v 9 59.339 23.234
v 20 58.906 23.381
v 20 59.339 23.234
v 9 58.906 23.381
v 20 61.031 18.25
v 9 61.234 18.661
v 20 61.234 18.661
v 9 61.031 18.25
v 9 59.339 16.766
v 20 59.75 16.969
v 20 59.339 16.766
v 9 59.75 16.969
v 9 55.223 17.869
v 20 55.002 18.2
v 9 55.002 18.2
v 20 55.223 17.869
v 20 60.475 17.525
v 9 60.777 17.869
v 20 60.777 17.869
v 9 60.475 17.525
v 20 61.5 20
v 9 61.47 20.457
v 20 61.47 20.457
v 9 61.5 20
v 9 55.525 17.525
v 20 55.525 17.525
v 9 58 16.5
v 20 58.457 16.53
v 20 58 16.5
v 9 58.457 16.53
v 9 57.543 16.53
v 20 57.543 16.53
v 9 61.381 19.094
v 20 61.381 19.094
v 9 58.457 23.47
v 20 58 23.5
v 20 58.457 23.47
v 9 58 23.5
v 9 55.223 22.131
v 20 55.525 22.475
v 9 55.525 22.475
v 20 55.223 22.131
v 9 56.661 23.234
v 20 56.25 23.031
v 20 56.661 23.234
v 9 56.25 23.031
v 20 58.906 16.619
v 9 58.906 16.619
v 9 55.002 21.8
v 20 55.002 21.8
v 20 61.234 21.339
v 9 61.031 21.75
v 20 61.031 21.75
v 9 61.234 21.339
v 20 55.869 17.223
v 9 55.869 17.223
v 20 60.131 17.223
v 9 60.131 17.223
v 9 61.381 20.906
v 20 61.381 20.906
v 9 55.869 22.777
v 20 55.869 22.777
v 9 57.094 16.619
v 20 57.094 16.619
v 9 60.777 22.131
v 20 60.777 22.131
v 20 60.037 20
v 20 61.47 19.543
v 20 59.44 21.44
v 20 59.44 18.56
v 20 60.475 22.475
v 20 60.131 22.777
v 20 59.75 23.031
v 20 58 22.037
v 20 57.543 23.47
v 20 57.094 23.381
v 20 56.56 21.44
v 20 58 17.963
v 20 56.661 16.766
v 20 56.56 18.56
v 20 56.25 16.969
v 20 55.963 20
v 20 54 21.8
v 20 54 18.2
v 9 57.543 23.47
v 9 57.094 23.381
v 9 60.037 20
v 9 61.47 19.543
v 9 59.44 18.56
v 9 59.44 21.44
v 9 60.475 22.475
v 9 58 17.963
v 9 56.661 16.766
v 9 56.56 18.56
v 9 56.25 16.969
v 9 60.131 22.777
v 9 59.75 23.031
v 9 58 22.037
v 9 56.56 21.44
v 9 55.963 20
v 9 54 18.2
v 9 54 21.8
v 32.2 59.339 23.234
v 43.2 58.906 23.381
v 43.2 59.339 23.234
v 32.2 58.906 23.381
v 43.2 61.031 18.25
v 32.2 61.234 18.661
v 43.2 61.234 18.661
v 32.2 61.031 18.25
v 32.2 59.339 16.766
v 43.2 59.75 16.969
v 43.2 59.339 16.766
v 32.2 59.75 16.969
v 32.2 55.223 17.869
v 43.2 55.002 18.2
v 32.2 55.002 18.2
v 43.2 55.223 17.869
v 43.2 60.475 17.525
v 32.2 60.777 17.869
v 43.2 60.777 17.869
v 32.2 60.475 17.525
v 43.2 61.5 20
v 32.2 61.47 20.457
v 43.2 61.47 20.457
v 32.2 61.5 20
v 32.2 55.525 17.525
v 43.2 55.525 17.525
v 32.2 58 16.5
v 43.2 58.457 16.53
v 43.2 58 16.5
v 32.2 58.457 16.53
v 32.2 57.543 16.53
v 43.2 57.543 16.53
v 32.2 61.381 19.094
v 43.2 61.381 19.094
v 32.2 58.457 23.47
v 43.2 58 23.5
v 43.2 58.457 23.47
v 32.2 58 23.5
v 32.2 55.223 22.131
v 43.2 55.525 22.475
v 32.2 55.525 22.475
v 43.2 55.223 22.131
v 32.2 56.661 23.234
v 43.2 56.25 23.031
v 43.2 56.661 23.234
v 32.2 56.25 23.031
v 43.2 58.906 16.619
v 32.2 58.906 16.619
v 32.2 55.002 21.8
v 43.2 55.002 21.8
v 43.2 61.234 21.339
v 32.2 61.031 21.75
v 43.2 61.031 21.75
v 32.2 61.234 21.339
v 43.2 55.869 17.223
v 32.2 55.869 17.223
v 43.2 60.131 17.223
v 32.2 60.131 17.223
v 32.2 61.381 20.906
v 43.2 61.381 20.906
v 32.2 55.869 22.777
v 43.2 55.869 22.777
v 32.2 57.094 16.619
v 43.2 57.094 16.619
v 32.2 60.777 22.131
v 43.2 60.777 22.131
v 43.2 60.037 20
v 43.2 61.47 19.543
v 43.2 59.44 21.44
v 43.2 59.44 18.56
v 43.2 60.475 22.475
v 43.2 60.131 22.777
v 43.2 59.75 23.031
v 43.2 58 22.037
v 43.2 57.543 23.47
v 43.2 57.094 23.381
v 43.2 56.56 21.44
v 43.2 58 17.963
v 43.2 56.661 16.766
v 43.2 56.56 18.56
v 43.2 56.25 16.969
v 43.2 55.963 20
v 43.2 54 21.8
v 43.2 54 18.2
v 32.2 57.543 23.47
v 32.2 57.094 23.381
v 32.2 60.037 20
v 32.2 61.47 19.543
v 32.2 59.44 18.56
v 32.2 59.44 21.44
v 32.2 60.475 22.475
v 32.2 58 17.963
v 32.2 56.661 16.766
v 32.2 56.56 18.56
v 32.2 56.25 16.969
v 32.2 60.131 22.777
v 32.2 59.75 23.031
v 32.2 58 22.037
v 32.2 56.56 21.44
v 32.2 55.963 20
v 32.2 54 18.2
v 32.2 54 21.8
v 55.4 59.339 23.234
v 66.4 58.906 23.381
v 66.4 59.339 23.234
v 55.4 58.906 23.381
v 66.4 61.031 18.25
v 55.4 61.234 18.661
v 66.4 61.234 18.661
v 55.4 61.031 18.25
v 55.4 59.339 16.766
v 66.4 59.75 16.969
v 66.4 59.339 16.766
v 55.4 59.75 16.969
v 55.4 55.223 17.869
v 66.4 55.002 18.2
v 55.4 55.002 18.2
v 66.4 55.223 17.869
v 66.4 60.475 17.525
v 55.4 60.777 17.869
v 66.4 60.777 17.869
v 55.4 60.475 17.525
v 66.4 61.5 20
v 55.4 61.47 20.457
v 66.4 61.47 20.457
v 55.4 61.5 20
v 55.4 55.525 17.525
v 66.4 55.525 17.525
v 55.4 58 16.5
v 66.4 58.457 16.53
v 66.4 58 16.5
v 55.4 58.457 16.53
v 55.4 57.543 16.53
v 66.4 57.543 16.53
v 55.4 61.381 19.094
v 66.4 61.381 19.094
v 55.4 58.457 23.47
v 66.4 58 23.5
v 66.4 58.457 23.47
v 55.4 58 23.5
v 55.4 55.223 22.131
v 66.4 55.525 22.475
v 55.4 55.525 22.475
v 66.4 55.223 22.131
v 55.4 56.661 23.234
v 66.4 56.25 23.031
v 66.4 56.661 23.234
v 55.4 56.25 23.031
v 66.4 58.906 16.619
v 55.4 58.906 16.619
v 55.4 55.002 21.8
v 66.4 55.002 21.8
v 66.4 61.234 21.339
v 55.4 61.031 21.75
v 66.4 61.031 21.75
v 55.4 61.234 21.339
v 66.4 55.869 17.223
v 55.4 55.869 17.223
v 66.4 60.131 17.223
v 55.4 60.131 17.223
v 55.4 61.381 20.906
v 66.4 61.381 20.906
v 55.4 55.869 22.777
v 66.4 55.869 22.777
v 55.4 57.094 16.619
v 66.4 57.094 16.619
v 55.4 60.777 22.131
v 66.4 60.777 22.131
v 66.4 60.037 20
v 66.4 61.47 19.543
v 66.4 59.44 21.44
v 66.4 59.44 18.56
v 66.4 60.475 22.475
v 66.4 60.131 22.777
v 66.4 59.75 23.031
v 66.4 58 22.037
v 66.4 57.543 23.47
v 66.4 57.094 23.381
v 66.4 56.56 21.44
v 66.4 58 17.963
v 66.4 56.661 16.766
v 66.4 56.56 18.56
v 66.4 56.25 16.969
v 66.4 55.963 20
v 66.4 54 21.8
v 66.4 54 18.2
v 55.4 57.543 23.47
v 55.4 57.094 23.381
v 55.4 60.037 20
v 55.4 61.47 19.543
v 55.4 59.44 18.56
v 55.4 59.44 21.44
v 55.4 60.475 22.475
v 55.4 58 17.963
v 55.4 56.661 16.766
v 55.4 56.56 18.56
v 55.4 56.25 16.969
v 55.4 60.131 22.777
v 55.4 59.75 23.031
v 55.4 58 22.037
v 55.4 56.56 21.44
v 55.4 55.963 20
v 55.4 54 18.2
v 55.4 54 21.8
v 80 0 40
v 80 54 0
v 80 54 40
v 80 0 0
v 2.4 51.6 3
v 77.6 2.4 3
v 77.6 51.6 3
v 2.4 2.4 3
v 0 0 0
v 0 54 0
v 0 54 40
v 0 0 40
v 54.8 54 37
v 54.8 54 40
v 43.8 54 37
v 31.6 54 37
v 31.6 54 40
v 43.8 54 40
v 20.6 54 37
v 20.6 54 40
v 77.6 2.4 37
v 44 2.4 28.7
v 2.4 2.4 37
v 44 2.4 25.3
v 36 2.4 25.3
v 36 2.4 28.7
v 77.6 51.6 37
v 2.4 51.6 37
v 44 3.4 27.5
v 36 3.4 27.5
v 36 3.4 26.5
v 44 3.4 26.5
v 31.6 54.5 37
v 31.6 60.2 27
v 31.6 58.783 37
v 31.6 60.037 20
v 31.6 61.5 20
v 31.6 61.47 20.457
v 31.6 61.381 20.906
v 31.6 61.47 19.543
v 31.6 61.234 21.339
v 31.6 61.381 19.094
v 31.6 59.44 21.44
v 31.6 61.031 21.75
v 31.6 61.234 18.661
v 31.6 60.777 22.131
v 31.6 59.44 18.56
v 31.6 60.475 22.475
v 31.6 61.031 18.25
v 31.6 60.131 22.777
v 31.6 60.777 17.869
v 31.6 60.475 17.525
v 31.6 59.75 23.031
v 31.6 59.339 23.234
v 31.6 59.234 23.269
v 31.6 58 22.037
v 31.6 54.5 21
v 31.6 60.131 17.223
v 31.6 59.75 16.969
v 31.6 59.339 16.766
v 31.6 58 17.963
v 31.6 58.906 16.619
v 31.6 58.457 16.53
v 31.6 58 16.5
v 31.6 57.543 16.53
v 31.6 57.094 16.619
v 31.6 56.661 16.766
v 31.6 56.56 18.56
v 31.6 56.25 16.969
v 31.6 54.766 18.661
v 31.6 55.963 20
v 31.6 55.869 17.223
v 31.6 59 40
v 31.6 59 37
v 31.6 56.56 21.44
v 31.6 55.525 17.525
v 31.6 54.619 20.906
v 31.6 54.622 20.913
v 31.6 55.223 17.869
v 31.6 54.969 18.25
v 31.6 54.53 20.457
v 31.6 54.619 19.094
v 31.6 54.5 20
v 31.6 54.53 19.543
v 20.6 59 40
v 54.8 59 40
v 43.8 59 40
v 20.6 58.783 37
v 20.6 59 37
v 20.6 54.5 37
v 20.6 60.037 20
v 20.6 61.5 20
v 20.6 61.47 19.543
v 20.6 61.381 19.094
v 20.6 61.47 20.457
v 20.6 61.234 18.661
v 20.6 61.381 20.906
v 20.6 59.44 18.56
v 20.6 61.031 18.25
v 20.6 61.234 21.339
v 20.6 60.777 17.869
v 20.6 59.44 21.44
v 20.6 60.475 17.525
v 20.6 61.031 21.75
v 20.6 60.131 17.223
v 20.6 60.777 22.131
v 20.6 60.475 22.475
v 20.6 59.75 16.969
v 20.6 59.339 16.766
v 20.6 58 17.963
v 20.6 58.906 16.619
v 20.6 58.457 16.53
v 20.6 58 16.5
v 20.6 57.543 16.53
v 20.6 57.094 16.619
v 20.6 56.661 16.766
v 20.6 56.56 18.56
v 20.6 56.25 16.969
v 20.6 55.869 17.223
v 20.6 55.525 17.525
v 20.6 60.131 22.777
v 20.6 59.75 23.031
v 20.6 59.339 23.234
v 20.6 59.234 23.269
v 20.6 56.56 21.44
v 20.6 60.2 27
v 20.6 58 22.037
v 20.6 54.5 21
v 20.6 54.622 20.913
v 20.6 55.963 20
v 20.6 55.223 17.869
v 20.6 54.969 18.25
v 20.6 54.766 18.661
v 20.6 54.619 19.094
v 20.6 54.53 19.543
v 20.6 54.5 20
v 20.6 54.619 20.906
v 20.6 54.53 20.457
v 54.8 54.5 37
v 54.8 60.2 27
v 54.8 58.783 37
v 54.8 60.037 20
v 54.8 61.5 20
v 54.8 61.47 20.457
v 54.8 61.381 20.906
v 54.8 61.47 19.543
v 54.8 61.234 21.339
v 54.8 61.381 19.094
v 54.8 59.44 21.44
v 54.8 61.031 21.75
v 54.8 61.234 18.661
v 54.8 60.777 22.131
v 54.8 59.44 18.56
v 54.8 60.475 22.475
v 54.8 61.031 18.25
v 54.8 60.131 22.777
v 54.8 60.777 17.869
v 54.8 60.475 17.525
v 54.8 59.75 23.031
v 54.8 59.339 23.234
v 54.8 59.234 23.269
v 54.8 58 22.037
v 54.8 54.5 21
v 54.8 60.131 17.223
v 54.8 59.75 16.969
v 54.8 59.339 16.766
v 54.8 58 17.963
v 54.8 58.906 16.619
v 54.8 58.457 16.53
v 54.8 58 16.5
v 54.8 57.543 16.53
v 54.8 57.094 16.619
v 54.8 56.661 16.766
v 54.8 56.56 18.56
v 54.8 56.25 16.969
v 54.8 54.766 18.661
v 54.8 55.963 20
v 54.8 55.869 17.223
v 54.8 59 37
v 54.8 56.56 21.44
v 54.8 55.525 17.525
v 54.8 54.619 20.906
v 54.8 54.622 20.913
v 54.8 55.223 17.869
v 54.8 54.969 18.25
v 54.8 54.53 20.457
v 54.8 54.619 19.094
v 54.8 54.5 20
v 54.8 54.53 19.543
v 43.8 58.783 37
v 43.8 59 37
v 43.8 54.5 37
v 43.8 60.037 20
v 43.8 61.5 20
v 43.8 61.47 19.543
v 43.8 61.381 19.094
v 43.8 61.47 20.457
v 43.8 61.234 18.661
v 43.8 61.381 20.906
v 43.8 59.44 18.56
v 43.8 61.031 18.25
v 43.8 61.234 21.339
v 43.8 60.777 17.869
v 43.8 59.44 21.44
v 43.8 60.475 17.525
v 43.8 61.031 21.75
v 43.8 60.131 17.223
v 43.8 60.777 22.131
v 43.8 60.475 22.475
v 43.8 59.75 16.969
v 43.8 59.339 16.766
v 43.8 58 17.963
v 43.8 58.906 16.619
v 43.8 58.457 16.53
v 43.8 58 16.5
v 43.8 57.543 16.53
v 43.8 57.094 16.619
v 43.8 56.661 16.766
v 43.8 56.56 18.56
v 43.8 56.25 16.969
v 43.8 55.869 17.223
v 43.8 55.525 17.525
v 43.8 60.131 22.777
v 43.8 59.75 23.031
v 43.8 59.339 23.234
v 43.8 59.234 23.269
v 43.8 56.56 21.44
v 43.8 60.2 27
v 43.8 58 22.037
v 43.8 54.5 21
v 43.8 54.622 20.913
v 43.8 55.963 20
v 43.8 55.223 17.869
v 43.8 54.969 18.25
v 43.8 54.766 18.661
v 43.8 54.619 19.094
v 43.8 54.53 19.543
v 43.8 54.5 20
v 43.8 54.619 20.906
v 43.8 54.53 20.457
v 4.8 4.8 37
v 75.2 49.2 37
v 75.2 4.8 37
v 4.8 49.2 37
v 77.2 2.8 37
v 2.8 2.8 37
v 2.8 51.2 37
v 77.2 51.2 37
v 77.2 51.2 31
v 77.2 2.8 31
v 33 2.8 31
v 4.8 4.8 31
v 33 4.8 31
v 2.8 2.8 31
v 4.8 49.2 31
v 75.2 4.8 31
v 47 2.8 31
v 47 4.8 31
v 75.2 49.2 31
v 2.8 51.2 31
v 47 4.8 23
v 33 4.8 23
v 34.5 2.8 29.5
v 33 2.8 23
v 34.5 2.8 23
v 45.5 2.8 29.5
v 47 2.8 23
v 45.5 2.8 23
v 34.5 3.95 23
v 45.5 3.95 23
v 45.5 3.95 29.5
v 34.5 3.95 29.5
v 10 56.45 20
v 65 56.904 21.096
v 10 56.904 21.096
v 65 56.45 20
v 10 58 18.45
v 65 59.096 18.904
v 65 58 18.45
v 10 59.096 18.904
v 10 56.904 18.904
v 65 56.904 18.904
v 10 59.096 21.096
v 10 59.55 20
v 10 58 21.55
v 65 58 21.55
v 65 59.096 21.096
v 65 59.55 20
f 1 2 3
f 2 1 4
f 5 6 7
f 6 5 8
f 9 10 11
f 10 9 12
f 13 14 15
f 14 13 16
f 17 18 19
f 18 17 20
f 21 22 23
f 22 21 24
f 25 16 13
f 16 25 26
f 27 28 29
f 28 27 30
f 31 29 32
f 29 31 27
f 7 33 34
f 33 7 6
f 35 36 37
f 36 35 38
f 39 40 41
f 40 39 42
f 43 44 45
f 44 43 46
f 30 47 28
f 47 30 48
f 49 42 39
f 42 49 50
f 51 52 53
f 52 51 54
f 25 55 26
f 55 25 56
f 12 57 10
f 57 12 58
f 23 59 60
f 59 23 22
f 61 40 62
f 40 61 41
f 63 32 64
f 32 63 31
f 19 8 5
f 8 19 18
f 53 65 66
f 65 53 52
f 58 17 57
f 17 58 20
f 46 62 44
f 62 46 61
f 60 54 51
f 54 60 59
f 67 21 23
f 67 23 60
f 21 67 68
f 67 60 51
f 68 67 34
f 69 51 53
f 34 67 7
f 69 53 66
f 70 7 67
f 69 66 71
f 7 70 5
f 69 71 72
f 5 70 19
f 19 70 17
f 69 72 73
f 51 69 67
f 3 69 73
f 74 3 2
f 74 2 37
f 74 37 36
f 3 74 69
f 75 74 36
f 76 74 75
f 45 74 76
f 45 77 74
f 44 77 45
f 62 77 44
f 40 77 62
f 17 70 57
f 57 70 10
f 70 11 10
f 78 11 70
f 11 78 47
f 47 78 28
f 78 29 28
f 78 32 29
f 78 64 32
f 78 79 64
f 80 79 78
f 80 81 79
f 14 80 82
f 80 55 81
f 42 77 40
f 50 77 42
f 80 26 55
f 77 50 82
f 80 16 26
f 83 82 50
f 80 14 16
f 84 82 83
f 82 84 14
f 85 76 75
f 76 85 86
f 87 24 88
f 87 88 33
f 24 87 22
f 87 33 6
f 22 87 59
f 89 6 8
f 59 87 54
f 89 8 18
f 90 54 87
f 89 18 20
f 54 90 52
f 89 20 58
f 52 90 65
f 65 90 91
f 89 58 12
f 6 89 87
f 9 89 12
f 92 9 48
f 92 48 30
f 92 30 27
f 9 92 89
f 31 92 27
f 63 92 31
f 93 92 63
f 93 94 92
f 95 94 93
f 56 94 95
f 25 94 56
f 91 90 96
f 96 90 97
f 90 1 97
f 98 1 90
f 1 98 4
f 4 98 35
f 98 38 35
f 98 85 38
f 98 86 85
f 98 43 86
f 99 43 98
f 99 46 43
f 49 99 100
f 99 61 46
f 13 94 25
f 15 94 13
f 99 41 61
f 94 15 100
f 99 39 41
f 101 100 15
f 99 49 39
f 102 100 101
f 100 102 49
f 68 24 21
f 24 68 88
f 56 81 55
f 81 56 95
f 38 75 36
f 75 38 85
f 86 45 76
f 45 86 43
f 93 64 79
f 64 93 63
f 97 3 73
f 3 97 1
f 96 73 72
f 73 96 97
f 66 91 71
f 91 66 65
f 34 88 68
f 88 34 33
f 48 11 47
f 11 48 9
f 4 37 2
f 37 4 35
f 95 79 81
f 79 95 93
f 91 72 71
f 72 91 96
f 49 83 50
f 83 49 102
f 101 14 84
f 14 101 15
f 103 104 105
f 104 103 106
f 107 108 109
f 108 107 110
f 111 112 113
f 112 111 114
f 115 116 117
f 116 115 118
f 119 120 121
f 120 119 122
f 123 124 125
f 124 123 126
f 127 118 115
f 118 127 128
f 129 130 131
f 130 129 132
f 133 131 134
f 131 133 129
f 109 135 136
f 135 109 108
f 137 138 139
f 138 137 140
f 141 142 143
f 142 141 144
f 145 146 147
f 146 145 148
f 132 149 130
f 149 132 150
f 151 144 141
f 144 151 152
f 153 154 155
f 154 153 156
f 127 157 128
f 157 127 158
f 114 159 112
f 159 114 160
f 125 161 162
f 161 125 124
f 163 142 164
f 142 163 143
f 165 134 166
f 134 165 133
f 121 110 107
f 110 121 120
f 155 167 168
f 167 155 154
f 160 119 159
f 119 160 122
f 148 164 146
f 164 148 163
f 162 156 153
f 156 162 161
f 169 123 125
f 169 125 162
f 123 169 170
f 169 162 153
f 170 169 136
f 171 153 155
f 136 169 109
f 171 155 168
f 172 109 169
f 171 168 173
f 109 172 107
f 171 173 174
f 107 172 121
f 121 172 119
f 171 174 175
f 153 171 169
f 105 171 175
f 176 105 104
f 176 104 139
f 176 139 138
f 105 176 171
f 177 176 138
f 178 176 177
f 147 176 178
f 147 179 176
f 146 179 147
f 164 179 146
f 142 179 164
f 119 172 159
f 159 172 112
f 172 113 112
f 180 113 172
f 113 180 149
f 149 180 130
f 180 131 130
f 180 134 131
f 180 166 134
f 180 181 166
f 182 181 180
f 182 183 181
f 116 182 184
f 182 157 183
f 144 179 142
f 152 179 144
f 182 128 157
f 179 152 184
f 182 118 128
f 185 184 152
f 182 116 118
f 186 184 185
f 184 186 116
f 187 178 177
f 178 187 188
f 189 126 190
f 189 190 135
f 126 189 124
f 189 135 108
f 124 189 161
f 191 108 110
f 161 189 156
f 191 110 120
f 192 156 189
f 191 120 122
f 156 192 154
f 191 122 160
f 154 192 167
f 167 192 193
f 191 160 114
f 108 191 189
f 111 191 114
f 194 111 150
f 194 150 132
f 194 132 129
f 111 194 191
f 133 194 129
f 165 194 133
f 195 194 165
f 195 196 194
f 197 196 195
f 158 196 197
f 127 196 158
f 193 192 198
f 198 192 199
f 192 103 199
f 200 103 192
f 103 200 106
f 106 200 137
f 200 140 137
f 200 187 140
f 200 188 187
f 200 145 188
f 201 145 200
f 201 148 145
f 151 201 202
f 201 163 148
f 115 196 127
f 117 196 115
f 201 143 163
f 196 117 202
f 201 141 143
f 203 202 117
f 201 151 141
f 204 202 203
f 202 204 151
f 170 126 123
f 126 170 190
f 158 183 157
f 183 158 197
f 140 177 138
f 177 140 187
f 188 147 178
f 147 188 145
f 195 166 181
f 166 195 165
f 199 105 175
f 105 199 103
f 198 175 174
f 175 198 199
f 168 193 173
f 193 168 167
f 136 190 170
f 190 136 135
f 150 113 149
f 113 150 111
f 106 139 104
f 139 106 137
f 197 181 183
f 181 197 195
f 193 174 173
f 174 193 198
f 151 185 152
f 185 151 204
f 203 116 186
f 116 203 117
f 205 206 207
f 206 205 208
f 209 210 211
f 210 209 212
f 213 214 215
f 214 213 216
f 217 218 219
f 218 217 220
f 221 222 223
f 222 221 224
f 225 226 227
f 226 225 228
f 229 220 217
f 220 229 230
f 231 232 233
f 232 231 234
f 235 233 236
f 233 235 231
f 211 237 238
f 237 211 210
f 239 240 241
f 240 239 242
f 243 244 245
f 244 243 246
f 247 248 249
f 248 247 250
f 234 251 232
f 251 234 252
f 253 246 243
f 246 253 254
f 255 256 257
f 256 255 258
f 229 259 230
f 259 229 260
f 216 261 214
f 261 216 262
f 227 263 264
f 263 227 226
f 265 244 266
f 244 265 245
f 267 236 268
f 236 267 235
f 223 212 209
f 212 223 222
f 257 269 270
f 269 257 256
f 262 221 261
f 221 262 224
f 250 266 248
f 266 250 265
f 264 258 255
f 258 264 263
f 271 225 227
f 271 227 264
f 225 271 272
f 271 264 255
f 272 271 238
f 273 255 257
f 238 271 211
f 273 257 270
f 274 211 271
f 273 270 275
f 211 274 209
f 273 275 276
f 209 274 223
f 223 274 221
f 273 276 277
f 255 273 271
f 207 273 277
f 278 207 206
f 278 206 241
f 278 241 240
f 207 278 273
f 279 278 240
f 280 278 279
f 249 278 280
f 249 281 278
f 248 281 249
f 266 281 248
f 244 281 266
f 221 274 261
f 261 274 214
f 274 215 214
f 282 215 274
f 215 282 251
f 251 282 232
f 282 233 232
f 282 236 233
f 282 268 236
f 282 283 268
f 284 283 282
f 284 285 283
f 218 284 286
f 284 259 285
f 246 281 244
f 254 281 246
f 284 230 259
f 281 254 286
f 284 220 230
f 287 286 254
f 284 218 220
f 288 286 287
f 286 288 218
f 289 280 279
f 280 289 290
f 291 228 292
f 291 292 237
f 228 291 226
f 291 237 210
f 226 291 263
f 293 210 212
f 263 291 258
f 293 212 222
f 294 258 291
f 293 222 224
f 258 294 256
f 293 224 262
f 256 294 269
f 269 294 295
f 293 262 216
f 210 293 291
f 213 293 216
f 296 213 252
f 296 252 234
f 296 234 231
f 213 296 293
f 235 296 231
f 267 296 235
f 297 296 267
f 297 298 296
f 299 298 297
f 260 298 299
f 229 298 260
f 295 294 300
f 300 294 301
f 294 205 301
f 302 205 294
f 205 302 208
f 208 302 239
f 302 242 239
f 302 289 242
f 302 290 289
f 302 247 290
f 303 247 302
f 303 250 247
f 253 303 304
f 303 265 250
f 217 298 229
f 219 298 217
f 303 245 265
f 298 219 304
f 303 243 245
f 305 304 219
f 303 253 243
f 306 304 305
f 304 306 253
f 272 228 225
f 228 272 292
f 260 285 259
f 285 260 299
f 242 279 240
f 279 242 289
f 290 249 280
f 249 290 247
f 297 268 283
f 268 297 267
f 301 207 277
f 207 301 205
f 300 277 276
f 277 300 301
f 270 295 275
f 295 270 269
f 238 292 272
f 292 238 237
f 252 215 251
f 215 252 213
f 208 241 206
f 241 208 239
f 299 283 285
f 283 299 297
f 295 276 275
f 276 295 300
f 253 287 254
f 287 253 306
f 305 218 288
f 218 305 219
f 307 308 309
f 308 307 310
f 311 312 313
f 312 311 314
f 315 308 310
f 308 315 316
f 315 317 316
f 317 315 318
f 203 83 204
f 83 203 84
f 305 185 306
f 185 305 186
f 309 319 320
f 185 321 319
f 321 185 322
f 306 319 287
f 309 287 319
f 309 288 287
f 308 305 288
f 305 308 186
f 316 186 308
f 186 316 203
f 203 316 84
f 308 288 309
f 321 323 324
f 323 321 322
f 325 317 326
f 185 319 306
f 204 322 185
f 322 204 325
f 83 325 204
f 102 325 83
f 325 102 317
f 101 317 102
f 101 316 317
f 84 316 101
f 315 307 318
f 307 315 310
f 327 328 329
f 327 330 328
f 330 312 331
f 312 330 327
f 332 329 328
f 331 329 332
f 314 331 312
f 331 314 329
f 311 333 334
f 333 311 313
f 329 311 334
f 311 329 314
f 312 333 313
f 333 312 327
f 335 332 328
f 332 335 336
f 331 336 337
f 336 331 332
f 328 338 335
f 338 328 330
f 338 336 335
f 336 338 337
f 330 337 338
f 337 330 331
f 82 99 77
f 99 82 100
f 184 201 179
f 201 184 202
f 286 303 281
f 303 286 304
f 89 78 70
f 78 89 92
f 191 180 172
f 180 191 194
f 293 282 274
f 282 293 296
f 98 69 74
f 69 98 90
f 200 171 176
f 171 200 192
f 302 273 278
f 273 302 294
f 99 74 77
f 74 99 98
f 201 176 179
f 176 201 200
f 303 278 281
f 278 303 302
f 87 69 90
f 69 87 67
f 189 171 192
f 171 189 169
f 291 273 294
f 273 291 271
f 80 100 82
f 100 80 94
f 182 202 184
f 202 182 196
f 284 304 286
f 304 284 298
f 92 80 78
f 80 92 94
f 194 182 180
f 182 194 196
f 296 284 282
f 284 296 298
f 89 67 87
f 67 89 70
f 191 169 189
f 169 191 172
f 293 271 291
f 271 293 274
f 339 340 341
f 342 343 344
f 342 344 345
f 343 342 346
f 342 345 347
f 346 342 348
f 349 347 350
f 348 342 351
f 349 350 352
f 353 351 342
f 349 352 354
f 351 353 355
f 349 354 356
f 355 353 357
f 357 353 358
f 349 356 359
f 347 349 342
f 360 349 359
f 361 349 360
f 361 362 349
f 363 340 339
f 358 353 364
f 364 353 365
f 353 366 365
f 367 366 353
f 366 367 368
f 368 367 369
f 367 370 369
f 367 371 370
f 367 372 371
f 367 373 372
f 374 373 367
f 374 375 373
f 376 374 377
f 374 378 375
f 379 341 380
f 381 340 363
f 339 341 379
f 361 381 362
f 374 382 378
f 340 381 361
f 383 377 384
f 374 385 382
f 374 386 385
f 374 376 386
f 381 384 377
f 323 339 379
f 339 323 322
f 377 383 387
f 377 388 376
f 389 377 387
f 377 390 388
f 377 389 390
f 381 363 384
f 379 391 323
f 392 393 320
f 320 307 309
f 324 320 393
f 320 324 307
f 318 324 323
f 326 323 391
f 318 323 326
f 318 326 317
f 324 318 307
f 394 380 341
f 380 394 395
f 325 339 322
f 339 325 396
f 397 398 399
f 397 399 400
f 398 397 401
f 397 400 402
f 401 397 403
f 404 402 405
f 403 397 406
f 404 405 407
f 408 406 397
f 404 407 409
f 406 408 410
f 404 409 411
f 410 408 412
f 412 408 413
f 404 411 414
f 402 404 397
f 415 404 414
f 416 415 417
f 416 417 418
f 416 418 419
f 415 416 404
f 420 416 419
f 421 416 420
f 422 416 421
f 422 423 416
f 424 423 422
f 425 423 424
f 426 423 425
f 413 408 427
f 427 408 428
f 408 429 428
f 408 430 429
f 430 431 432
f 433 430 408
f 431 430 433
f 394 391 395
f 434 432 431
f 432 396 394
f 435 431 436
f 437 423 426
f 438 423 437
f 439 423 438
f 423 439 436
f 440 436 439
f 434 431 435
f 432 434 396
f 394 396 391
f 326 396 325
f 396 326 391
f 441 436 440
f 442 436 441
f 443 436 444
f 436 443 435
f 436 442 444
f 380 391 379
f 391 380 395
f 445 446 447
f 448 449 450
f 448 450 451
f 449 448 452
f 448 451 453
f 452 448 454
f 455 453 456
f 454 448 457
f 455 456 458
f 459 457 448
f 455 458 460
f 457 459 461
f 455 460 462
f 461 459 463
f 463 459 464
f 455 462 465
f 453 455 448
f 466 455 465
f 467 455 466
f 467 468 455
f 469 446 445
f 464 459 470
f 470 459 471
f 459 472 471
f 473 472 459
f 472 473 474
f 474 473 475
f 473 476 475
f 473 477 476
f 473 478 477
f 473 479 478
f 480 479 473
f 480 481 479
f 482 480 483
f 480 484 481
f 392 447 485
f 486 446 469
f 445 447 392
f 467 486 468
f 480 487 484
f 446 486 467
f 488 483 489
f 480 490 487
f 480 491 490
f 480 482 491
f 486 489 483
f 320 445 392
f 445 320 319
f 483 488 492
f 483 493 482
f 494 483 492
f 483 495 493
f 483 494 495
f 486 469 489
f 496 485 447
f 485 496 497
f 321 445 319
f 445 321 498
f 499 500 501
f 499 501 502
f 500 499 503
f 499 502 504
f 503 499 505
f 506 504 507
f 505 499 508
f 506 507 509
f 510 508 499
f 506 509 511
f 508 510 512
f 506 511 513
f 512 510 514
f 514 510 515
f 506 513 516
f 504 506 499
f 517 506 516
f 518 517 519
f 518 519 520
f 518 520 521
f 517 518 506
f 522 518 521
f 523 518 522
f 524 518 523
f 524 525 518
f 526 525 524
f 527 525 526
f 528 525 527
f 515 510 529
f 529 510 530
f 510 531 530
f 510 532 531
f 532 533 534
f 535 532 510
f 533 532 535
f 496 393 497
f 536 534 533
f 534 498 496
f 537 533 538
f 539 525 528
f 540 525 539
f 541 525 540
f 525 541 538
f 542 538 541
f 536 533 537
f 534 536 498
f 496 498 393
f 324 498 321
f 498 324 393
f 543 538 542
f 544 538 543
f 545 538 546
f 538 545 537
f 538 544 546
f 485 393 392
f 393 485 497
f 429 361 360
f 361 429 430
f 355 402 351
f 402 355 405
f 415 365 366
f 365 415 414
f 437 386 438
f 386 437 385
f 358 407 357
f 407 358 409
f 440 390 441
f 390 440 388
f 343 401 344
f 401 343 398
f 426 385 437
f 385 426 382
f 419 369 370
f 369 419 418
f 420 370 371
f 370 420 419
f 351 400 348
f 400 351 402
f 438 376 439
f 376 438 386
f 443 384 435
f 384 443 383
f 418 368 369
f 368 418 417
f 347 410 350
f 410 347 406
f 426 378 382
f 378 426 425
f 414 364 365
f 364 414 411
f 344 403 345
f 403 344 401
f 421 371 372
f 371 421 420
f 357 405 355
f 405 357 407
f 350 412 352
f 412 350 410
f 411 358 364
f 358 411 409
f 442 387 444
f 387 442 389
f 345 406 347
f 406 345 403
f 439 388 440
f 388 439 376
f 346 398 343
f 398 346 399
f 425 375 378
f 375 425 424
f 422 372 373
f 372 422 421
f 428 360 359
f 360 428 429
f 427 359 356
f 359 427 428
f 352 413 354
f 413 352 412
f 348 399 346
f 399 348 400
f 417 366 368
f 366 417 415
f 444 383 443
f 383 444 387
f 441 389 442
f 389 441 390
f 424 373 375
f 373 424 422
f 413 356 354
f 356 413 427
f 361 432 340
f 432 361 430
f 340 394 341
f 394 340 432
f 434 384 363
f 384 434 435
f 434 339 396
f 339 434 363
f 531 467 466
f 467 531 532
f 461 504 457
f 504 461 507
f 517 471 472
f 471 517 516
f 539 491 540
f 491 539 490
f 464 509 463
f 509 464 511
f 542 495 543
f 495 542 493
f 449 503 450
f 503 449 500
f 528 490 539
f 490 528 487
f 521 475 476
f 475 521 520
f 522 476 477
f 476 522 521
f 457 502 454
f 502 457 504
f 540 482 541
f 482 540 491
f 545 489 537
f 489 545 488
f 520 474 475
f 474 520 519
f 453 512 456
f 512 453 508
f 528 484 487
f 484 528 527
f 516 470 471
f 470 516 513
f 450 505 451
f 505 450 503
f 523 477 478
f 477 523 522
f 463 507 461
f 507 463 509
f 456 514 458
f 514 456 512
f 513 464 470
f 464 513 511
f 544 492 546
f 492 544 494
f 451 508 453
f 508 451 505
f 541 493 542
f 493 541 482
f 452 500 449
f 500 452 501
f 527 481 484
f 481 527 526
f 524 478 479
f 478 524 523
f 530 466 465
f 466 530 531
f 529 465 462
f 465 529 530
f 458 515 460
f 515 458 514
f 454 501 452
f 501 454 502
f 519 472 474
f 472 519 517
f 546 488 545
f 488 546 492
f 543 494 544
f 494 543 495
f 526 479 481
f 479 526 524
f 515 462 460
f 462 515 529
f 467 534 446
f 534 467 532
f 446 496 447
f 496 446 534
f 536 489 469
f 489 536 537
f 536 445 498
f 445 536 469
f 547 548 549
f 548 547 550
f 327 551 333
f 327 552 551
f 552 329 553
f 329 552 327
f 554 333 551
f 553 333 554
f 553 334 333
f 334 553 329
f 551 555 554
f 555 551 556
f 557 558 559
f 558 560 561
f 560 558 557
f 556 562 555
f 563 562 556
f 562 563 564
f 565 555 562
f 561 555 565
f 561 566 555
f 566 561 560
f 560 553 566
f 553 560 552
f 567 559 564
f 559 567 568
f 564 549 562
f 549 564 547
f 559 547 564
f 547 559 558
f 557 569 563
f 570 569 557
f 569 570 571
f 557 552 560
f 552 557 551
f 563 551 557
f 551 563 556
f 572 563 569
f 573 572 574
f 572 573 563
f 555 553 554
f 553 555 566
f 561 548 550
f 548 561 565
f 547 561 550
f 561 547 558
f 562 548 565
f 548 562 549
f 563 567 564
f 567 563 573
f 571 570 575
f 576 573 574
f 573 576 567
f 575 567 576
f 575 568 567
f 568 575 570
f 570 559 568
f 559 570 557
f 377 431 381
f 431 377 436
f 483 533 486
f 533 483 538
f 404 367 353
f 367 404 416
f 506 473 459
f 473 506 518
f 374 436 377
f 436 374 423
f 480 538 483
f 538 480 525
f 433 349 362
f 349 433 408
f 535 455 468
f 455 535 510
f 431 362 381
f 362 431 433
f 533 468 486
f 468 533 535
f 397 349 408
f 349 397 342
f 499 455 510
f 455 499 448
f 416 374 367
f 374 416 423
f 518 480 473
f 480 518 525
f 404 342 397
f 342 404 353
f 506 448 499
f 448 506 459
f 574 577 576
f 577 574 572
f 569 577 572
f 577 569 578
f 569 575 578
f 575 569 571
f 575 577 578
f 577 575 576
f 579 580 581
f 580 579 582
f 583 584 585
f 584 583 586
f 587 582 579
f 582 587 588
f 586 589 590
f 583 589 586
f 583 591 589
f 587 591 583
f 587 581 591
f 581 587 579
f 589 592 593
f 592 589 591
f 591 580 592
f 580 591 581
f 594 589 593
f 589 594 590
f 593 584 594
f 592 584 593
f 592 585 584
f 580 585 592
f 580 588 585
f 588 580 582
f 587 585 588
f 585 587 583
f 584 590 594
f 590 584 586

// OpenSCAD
// Box with print-in-place hinge
// Closed body 80 (x) x 54 (y body, 61.5 incl. hinge) x 40 (z) mm.
// Lid occupies the top 10 mm. Hinge pin axis: y=58, z=20 (mid-height at the
// back), so swinging the lid -180 deg about that axis lays the lid flat on
// the bed behind the box: that is the print-in-place pose.
// Clearances (PLA, 0.4 nozzle): pin/bore 0.40 radial, knuckle axial gaps
// 0.6, lid lip to box walls 0.4, lid barrels to box back wall 0.5.

part = "assembly"; // [assembly, box, lid, pin]
cadverify_only = "";

W = 80; D = 54; H = 40; box_h = 30;
wall = 2.4; floor_t = 3; plate_t = 3;
hinge_y = 58; hinge_z = 20;
barrel_r = 3.5; bore_r = 2.0; pin_r = 1.55; cap_r = 2.9;
hinge_ymax = hinge_y + barrel_r;          // 61.5
box_segs  = [[9, 11], [32.2, 11], [55.4, 11]];   // [x0, len]
lid_segs  = [[20.6, 11], [43.8, 11]];
pin_x0 = 10; pin_len = 55;

module instance(name, partname, unit = 1) {
    echo(cadverify_instance = [name, partname, unit]);
    if (cadverify_only == "" || cadverify_only == name) children();
}

// Extrude a (y,z) profile along +x starting at x0, offset by (oy,oz).
module extrude_yz(profile, x0, len, oy = 0, oz = 0) {
    multmatrix([[0,0,1,x0],[1,0,0,oy],[0,1,0,oz],[0,0,0,1]])
        linear_extrude(height = len) polygon(points = profile);
}

module barrel(x0, len) {
    translate([x0, hinge_y, hinge_z]) rotate([0, 90, 0])
        cylinder(h = len, r = barrel_r, $fn = 48);
}

bore_fr = pin_r * cos(22.5) + 0.45;   // bore facet distance: uniform 0.45 gap around the pin
bore_oct_r = bore_fr / cos(22.5);
module bore_cut() {
    // octagonal bore, same diamond orientation as the pin: facet gap 0.45 everywhere
    extrude_yz(oct_pts(bore_oct_r, 0), 4, 72, hinge_y, hinge_z);
}

module box_closed() {
    difference() {
        union() {
            // floor and walls up to z=30
            translate([0, 0, 0]) cube([W, D, floor_t]);
            translate([0, 0, floor_t]) cube([W, wall, box_h - floor_t]);              // front
            translate([0, D - wall, floor_t]) cube([W, wall, box_h - floor_t]);       // back
            translate([0, wall, floor_t]) cube([wall, D - 2*wall, box_h - floor_t]);  // left
            translate([W - wall, wall, floor_t]) cube([wall, D - 2*wall, box_h - floor_t]); // right
            // front catch detent bump on the inner front wall (wedged ridge)
            extrude_yz([[2.4,25.3],[3.4,26.5],[3.4,27.5],[2.4,28.7]], 36, 8);
            // hinge knuckles + arms to the back wall
            for (s = box_segs) {
                barrel(s[0], s[1]);
                translate([s[0], 53.5, hinge_z - 1.8]) cube([s[1], 5, 3.6]);
            }
        }
        bore_cut();
    }
}

module lid_closed() {
    difference() {
        union() {
            // top plate + back hinge tabs
            translate([0, 0, H - plate_t]) cube([W, D, plate_t]);
            for (s = lid_segs) translate([s[0], 53, H - plate_t]) cube([s[1], 6, plate_t]);
            // external skirt (down to z=30, flush with box walls outside)
            translate([0, 0, box_h]) cube([W, wall, H - plate_t - box_h]);                  // front
            translate([0, D - wall, box_h]) cube([W, wall, H - plate_t - box_h]);           // back
            translate([0, wall, box_h]) cube([wall, D - 2*wall, H - plate_t - box_h]);      // left
            translate([W - wall, wall, box_h]) cube([wall, D - 2*wall, H - plate_t - box_h]); // right
            // inner sealing lip (0.4 clear of box inner walls)
            translate([2.8, 2.8, 31]) cube([74.4, 2, 6]);        // front lip
            translate([2.8, 49.2, 31]) cube([74.4, 2, 6]);       // back lip
            translate([2.8, 4.8, 31]) cube([2, 44.4, 6]);        // left lip
            translate([75.2, 4.8, 31]) cube([2, 44.4, 6]);       // right lip
            // central catch tongue on the front lip, reaching down to z=23
            translate([33, 2.8, 23]) cube([14, 2, 8]);
            // hinge knuckles + diagonal straps up to the plate tabs
            for (s = lid_segs) {
                barrel(s[0], s[1]);
                extrude_yz([[54.5,39],[58.5,39],[60.2,27],[58,18.5],[54.5,21]], s[0], s[1]);
            }
        }
        bore_cut();
        // catch notch in the tongue: open at the bottom, receives the box detent bump when shut
        translate([34.5, 2.7, 22.5]) cube([11, 1.25, 7]);
        // fingernail scoop in the front skirt bottom edge
        translate([40, -1, box_h]) rotate([90, 0, 0]) cylinder(h = 4, r = 4.5, $fn = 32);
    }
}

function oct_pts(r, off = 22.5) = [for (i = [0:7]) let (a = off + 45*i) [r*cos(a), r*sin(a)]];

module pin_closed() {
    // octagonal axle with a vertex up/down (45 deg facets, no flat ceiling),
    // ends protrude past the outer knuckles
    extrude_yz(oct_pts(pin_r, 0), pin_x0, pin_len, hinge_y, hinge_z);
}

// --- printed (as-exported) orientations ---
module lid_printed() {
    // closed lid rotated 180 deg about the hinge axis, then dropped to y=0
    translate([0, hinge_ymax, H]) rotate([180, 0, 0]) lid_closed();
}
pin_off = pin_r; // 1.55 half-height of the diamond-oriented shaft
module pin_printed() {
    translate([-pin_x0, -(hinge_y - pin_off), -(hinge_z - pin_off)]) pin_closed();
}

box_spec = [
    ["bounds", [[0, 0, 0], [W, hinge_ymax, box_h]]],
    ["bodies", 1],
    ["support_faces", [["bed", "-z", 4000]]],
    ["overhangs_allowed", [
        ["hinge barrels and arms: horizontal print-in-place axle housings, bore is self-supported inside the tube", [[8, 53, 16], [67.5, 62, 24]]]
    ]],
    ["copies", 1],
    ["details", [
        ["floor", "material", [[10, 10, 0.5], [70, 44, 2.5]], 0.98],
        ["interior", "void", [[6, 6, 8], [74, 48, 24]], 0.98],
        ["front_wall", "thickness", [40, -1, 15], [0, 1, 0], 2.4],
        ["knuckle_arm", "material", [[10, 53.8, 18.8], [19, 55.8, 21.2]], 0.9],
        ["hinge_bore", "void", [[10, 57.1, 19.1], [19, 58.9, 20.9]], 1.0],
        ["catch_bump", "material", [[37, 2.6, 26.6], [43, 3.3, 27.4]], 0.85],
        ["catch_bump_view", "view", [[35, 2, 24], [45, 4.5, 29.5]]],
        ["hinge_view", "view", [[8, 53, 15], [67, 62, 25]]]
    ]]
];

lid_spec = [
    ["bounds", [[0, 0, 0], [W, hinge_ymax, 23.5]]],
    ["bodies", 1],
    ["support_faces", [["bed", "-z", 4000]]],
    ["overhangs_allowed", [
        ["hinge barrels and straps: horizontal print-in-place axle housings", [[20, 0, 0], [55.5, 8, 24]]],
        ["catch groove underside in print pose", [[34, 56, 11], [46, 59, 15]]]
    ]],
    ["copies", 1],
    ["details", [
        ["top_plate", "material", [[10, 17.5, 0.5], [70, 51.5, 2.5]], 0.98],
        ["front_skirt", "material", [[10, 59.3, 4.5], [70, 61.3, 7.5]], 0.9],
        ["plate_thickness", "thickness", [40, 30, -1], [0, 0, 1], 3],
        ["tongue", "material", [[38, 57, 9.2], [42, 58.5, 10.3]], 0.85],
        ["catch_groove", "void", [[37, 57.7, 12], [43, 58.5, 14]], 1.0],
        ["hinge_bore", "void", [[23, 2.6, 19.1], [29, 4.4, 20.9]], 1.0],
        ["strap", "material", [[23, 3.5, 8], [29, 6.5, 12]], 0.8],
        ["catch_groove_view", "view", [[33, 56.5, 9], [47, 59, 17]]],
        ["lid_knuckle_view", "view", [[20, 0, 16], [32, 8, 24]]]
    ]]
];

pin_spec = [
    ["bounds", [[0, 0, 0], [pin_len, 2*pin_off, 2*pin_off]]],
    ["bodies", 1],
    ["overhangs_allowed", [
        ["the two bottom facets of the diamond print-in-place axle, 0.45 above the bore", [[-0.1, 0.35, -0.1], [55.1, 2.75, 0.55]]]
    ]],
    ["copies", 1],
    ["details", [
        ["shaft", "material", [[10, 0.9, 0.9], [50, 2.2, 2.2]], 0.9],
        ["shaft_thickness", "thickness", [30, pin_off, -1], [0, 0, 1], 3.1],
        ["pin_end_view", "view", [[0, 0, 0], [3, 3.1, 3.1]]]
    ]]
];

assembly_spec = [
    ["bounds", [[0, 0, 0], [W, hinge_ymax, H]]],
    ["support_faces", [["table", "-z", 4000]]],
    ["motions", [
        ["lid_swing", ["lid"], "rotate", [0, hinge_y, hinge_z], [1, 0, 0], [-180, 0],
            ["flex", [["lid", "box", 1.0, "front catch tongue snaps 0.6 mm over the detent bump while closing"]]]]
    ]],
    ["assembly_order", [
        [["box"], [0, 0, 0]],
        [["lid"], [0, 0, -1], ["rotate", [0, hinge_y, hinge_z], [1, 0, 0], 180]],
        [["pin"], [1, 0, 0]]
    ]],
    ["print_in_place", 0.4],
    ["print_pose", [["lid_swing", -180]]],
    ["overhangs_allowed", [
        ["box hinge barrels in print pose", [[8, 53, 16], [67.5, 62, 24]]],
        ["lid hinge barrels and straps in print pose", [[20, 53, 0], [56, 62, 24]]],
        ["horizontal pin inside its bore, 0.4 above the bore surface", [[5, 55, 16.5], [70.5, 61, 20]]],
        ["lid catch groove in print pose", [[33, 110, 2], [47, 114, 18]]]
    ]]
];

if (part == "box") {
    echo(cadverify_spec = box_spec);
    box_closed();
} else if (part == "lid") {
    echo(cadverify_spec = lid_spec);
    lid_printed();
} else if (part == "pin") {
    echo(cadverify_spec = pin_spec);
    pin_printed();
} else {
    echo(cadverify_spec = assembly_spec);
    instance("box", "box") box_closed();
    instance("lid", "lid")
        translate([0, hinge_ymax, H]) rotate([180, 0, 0]) lid_printed();
    instance("pin", "pin")
        translate([pin_x0, hinge_y - pin_off, hinge_z - pin_off]) pin_printed();
}
